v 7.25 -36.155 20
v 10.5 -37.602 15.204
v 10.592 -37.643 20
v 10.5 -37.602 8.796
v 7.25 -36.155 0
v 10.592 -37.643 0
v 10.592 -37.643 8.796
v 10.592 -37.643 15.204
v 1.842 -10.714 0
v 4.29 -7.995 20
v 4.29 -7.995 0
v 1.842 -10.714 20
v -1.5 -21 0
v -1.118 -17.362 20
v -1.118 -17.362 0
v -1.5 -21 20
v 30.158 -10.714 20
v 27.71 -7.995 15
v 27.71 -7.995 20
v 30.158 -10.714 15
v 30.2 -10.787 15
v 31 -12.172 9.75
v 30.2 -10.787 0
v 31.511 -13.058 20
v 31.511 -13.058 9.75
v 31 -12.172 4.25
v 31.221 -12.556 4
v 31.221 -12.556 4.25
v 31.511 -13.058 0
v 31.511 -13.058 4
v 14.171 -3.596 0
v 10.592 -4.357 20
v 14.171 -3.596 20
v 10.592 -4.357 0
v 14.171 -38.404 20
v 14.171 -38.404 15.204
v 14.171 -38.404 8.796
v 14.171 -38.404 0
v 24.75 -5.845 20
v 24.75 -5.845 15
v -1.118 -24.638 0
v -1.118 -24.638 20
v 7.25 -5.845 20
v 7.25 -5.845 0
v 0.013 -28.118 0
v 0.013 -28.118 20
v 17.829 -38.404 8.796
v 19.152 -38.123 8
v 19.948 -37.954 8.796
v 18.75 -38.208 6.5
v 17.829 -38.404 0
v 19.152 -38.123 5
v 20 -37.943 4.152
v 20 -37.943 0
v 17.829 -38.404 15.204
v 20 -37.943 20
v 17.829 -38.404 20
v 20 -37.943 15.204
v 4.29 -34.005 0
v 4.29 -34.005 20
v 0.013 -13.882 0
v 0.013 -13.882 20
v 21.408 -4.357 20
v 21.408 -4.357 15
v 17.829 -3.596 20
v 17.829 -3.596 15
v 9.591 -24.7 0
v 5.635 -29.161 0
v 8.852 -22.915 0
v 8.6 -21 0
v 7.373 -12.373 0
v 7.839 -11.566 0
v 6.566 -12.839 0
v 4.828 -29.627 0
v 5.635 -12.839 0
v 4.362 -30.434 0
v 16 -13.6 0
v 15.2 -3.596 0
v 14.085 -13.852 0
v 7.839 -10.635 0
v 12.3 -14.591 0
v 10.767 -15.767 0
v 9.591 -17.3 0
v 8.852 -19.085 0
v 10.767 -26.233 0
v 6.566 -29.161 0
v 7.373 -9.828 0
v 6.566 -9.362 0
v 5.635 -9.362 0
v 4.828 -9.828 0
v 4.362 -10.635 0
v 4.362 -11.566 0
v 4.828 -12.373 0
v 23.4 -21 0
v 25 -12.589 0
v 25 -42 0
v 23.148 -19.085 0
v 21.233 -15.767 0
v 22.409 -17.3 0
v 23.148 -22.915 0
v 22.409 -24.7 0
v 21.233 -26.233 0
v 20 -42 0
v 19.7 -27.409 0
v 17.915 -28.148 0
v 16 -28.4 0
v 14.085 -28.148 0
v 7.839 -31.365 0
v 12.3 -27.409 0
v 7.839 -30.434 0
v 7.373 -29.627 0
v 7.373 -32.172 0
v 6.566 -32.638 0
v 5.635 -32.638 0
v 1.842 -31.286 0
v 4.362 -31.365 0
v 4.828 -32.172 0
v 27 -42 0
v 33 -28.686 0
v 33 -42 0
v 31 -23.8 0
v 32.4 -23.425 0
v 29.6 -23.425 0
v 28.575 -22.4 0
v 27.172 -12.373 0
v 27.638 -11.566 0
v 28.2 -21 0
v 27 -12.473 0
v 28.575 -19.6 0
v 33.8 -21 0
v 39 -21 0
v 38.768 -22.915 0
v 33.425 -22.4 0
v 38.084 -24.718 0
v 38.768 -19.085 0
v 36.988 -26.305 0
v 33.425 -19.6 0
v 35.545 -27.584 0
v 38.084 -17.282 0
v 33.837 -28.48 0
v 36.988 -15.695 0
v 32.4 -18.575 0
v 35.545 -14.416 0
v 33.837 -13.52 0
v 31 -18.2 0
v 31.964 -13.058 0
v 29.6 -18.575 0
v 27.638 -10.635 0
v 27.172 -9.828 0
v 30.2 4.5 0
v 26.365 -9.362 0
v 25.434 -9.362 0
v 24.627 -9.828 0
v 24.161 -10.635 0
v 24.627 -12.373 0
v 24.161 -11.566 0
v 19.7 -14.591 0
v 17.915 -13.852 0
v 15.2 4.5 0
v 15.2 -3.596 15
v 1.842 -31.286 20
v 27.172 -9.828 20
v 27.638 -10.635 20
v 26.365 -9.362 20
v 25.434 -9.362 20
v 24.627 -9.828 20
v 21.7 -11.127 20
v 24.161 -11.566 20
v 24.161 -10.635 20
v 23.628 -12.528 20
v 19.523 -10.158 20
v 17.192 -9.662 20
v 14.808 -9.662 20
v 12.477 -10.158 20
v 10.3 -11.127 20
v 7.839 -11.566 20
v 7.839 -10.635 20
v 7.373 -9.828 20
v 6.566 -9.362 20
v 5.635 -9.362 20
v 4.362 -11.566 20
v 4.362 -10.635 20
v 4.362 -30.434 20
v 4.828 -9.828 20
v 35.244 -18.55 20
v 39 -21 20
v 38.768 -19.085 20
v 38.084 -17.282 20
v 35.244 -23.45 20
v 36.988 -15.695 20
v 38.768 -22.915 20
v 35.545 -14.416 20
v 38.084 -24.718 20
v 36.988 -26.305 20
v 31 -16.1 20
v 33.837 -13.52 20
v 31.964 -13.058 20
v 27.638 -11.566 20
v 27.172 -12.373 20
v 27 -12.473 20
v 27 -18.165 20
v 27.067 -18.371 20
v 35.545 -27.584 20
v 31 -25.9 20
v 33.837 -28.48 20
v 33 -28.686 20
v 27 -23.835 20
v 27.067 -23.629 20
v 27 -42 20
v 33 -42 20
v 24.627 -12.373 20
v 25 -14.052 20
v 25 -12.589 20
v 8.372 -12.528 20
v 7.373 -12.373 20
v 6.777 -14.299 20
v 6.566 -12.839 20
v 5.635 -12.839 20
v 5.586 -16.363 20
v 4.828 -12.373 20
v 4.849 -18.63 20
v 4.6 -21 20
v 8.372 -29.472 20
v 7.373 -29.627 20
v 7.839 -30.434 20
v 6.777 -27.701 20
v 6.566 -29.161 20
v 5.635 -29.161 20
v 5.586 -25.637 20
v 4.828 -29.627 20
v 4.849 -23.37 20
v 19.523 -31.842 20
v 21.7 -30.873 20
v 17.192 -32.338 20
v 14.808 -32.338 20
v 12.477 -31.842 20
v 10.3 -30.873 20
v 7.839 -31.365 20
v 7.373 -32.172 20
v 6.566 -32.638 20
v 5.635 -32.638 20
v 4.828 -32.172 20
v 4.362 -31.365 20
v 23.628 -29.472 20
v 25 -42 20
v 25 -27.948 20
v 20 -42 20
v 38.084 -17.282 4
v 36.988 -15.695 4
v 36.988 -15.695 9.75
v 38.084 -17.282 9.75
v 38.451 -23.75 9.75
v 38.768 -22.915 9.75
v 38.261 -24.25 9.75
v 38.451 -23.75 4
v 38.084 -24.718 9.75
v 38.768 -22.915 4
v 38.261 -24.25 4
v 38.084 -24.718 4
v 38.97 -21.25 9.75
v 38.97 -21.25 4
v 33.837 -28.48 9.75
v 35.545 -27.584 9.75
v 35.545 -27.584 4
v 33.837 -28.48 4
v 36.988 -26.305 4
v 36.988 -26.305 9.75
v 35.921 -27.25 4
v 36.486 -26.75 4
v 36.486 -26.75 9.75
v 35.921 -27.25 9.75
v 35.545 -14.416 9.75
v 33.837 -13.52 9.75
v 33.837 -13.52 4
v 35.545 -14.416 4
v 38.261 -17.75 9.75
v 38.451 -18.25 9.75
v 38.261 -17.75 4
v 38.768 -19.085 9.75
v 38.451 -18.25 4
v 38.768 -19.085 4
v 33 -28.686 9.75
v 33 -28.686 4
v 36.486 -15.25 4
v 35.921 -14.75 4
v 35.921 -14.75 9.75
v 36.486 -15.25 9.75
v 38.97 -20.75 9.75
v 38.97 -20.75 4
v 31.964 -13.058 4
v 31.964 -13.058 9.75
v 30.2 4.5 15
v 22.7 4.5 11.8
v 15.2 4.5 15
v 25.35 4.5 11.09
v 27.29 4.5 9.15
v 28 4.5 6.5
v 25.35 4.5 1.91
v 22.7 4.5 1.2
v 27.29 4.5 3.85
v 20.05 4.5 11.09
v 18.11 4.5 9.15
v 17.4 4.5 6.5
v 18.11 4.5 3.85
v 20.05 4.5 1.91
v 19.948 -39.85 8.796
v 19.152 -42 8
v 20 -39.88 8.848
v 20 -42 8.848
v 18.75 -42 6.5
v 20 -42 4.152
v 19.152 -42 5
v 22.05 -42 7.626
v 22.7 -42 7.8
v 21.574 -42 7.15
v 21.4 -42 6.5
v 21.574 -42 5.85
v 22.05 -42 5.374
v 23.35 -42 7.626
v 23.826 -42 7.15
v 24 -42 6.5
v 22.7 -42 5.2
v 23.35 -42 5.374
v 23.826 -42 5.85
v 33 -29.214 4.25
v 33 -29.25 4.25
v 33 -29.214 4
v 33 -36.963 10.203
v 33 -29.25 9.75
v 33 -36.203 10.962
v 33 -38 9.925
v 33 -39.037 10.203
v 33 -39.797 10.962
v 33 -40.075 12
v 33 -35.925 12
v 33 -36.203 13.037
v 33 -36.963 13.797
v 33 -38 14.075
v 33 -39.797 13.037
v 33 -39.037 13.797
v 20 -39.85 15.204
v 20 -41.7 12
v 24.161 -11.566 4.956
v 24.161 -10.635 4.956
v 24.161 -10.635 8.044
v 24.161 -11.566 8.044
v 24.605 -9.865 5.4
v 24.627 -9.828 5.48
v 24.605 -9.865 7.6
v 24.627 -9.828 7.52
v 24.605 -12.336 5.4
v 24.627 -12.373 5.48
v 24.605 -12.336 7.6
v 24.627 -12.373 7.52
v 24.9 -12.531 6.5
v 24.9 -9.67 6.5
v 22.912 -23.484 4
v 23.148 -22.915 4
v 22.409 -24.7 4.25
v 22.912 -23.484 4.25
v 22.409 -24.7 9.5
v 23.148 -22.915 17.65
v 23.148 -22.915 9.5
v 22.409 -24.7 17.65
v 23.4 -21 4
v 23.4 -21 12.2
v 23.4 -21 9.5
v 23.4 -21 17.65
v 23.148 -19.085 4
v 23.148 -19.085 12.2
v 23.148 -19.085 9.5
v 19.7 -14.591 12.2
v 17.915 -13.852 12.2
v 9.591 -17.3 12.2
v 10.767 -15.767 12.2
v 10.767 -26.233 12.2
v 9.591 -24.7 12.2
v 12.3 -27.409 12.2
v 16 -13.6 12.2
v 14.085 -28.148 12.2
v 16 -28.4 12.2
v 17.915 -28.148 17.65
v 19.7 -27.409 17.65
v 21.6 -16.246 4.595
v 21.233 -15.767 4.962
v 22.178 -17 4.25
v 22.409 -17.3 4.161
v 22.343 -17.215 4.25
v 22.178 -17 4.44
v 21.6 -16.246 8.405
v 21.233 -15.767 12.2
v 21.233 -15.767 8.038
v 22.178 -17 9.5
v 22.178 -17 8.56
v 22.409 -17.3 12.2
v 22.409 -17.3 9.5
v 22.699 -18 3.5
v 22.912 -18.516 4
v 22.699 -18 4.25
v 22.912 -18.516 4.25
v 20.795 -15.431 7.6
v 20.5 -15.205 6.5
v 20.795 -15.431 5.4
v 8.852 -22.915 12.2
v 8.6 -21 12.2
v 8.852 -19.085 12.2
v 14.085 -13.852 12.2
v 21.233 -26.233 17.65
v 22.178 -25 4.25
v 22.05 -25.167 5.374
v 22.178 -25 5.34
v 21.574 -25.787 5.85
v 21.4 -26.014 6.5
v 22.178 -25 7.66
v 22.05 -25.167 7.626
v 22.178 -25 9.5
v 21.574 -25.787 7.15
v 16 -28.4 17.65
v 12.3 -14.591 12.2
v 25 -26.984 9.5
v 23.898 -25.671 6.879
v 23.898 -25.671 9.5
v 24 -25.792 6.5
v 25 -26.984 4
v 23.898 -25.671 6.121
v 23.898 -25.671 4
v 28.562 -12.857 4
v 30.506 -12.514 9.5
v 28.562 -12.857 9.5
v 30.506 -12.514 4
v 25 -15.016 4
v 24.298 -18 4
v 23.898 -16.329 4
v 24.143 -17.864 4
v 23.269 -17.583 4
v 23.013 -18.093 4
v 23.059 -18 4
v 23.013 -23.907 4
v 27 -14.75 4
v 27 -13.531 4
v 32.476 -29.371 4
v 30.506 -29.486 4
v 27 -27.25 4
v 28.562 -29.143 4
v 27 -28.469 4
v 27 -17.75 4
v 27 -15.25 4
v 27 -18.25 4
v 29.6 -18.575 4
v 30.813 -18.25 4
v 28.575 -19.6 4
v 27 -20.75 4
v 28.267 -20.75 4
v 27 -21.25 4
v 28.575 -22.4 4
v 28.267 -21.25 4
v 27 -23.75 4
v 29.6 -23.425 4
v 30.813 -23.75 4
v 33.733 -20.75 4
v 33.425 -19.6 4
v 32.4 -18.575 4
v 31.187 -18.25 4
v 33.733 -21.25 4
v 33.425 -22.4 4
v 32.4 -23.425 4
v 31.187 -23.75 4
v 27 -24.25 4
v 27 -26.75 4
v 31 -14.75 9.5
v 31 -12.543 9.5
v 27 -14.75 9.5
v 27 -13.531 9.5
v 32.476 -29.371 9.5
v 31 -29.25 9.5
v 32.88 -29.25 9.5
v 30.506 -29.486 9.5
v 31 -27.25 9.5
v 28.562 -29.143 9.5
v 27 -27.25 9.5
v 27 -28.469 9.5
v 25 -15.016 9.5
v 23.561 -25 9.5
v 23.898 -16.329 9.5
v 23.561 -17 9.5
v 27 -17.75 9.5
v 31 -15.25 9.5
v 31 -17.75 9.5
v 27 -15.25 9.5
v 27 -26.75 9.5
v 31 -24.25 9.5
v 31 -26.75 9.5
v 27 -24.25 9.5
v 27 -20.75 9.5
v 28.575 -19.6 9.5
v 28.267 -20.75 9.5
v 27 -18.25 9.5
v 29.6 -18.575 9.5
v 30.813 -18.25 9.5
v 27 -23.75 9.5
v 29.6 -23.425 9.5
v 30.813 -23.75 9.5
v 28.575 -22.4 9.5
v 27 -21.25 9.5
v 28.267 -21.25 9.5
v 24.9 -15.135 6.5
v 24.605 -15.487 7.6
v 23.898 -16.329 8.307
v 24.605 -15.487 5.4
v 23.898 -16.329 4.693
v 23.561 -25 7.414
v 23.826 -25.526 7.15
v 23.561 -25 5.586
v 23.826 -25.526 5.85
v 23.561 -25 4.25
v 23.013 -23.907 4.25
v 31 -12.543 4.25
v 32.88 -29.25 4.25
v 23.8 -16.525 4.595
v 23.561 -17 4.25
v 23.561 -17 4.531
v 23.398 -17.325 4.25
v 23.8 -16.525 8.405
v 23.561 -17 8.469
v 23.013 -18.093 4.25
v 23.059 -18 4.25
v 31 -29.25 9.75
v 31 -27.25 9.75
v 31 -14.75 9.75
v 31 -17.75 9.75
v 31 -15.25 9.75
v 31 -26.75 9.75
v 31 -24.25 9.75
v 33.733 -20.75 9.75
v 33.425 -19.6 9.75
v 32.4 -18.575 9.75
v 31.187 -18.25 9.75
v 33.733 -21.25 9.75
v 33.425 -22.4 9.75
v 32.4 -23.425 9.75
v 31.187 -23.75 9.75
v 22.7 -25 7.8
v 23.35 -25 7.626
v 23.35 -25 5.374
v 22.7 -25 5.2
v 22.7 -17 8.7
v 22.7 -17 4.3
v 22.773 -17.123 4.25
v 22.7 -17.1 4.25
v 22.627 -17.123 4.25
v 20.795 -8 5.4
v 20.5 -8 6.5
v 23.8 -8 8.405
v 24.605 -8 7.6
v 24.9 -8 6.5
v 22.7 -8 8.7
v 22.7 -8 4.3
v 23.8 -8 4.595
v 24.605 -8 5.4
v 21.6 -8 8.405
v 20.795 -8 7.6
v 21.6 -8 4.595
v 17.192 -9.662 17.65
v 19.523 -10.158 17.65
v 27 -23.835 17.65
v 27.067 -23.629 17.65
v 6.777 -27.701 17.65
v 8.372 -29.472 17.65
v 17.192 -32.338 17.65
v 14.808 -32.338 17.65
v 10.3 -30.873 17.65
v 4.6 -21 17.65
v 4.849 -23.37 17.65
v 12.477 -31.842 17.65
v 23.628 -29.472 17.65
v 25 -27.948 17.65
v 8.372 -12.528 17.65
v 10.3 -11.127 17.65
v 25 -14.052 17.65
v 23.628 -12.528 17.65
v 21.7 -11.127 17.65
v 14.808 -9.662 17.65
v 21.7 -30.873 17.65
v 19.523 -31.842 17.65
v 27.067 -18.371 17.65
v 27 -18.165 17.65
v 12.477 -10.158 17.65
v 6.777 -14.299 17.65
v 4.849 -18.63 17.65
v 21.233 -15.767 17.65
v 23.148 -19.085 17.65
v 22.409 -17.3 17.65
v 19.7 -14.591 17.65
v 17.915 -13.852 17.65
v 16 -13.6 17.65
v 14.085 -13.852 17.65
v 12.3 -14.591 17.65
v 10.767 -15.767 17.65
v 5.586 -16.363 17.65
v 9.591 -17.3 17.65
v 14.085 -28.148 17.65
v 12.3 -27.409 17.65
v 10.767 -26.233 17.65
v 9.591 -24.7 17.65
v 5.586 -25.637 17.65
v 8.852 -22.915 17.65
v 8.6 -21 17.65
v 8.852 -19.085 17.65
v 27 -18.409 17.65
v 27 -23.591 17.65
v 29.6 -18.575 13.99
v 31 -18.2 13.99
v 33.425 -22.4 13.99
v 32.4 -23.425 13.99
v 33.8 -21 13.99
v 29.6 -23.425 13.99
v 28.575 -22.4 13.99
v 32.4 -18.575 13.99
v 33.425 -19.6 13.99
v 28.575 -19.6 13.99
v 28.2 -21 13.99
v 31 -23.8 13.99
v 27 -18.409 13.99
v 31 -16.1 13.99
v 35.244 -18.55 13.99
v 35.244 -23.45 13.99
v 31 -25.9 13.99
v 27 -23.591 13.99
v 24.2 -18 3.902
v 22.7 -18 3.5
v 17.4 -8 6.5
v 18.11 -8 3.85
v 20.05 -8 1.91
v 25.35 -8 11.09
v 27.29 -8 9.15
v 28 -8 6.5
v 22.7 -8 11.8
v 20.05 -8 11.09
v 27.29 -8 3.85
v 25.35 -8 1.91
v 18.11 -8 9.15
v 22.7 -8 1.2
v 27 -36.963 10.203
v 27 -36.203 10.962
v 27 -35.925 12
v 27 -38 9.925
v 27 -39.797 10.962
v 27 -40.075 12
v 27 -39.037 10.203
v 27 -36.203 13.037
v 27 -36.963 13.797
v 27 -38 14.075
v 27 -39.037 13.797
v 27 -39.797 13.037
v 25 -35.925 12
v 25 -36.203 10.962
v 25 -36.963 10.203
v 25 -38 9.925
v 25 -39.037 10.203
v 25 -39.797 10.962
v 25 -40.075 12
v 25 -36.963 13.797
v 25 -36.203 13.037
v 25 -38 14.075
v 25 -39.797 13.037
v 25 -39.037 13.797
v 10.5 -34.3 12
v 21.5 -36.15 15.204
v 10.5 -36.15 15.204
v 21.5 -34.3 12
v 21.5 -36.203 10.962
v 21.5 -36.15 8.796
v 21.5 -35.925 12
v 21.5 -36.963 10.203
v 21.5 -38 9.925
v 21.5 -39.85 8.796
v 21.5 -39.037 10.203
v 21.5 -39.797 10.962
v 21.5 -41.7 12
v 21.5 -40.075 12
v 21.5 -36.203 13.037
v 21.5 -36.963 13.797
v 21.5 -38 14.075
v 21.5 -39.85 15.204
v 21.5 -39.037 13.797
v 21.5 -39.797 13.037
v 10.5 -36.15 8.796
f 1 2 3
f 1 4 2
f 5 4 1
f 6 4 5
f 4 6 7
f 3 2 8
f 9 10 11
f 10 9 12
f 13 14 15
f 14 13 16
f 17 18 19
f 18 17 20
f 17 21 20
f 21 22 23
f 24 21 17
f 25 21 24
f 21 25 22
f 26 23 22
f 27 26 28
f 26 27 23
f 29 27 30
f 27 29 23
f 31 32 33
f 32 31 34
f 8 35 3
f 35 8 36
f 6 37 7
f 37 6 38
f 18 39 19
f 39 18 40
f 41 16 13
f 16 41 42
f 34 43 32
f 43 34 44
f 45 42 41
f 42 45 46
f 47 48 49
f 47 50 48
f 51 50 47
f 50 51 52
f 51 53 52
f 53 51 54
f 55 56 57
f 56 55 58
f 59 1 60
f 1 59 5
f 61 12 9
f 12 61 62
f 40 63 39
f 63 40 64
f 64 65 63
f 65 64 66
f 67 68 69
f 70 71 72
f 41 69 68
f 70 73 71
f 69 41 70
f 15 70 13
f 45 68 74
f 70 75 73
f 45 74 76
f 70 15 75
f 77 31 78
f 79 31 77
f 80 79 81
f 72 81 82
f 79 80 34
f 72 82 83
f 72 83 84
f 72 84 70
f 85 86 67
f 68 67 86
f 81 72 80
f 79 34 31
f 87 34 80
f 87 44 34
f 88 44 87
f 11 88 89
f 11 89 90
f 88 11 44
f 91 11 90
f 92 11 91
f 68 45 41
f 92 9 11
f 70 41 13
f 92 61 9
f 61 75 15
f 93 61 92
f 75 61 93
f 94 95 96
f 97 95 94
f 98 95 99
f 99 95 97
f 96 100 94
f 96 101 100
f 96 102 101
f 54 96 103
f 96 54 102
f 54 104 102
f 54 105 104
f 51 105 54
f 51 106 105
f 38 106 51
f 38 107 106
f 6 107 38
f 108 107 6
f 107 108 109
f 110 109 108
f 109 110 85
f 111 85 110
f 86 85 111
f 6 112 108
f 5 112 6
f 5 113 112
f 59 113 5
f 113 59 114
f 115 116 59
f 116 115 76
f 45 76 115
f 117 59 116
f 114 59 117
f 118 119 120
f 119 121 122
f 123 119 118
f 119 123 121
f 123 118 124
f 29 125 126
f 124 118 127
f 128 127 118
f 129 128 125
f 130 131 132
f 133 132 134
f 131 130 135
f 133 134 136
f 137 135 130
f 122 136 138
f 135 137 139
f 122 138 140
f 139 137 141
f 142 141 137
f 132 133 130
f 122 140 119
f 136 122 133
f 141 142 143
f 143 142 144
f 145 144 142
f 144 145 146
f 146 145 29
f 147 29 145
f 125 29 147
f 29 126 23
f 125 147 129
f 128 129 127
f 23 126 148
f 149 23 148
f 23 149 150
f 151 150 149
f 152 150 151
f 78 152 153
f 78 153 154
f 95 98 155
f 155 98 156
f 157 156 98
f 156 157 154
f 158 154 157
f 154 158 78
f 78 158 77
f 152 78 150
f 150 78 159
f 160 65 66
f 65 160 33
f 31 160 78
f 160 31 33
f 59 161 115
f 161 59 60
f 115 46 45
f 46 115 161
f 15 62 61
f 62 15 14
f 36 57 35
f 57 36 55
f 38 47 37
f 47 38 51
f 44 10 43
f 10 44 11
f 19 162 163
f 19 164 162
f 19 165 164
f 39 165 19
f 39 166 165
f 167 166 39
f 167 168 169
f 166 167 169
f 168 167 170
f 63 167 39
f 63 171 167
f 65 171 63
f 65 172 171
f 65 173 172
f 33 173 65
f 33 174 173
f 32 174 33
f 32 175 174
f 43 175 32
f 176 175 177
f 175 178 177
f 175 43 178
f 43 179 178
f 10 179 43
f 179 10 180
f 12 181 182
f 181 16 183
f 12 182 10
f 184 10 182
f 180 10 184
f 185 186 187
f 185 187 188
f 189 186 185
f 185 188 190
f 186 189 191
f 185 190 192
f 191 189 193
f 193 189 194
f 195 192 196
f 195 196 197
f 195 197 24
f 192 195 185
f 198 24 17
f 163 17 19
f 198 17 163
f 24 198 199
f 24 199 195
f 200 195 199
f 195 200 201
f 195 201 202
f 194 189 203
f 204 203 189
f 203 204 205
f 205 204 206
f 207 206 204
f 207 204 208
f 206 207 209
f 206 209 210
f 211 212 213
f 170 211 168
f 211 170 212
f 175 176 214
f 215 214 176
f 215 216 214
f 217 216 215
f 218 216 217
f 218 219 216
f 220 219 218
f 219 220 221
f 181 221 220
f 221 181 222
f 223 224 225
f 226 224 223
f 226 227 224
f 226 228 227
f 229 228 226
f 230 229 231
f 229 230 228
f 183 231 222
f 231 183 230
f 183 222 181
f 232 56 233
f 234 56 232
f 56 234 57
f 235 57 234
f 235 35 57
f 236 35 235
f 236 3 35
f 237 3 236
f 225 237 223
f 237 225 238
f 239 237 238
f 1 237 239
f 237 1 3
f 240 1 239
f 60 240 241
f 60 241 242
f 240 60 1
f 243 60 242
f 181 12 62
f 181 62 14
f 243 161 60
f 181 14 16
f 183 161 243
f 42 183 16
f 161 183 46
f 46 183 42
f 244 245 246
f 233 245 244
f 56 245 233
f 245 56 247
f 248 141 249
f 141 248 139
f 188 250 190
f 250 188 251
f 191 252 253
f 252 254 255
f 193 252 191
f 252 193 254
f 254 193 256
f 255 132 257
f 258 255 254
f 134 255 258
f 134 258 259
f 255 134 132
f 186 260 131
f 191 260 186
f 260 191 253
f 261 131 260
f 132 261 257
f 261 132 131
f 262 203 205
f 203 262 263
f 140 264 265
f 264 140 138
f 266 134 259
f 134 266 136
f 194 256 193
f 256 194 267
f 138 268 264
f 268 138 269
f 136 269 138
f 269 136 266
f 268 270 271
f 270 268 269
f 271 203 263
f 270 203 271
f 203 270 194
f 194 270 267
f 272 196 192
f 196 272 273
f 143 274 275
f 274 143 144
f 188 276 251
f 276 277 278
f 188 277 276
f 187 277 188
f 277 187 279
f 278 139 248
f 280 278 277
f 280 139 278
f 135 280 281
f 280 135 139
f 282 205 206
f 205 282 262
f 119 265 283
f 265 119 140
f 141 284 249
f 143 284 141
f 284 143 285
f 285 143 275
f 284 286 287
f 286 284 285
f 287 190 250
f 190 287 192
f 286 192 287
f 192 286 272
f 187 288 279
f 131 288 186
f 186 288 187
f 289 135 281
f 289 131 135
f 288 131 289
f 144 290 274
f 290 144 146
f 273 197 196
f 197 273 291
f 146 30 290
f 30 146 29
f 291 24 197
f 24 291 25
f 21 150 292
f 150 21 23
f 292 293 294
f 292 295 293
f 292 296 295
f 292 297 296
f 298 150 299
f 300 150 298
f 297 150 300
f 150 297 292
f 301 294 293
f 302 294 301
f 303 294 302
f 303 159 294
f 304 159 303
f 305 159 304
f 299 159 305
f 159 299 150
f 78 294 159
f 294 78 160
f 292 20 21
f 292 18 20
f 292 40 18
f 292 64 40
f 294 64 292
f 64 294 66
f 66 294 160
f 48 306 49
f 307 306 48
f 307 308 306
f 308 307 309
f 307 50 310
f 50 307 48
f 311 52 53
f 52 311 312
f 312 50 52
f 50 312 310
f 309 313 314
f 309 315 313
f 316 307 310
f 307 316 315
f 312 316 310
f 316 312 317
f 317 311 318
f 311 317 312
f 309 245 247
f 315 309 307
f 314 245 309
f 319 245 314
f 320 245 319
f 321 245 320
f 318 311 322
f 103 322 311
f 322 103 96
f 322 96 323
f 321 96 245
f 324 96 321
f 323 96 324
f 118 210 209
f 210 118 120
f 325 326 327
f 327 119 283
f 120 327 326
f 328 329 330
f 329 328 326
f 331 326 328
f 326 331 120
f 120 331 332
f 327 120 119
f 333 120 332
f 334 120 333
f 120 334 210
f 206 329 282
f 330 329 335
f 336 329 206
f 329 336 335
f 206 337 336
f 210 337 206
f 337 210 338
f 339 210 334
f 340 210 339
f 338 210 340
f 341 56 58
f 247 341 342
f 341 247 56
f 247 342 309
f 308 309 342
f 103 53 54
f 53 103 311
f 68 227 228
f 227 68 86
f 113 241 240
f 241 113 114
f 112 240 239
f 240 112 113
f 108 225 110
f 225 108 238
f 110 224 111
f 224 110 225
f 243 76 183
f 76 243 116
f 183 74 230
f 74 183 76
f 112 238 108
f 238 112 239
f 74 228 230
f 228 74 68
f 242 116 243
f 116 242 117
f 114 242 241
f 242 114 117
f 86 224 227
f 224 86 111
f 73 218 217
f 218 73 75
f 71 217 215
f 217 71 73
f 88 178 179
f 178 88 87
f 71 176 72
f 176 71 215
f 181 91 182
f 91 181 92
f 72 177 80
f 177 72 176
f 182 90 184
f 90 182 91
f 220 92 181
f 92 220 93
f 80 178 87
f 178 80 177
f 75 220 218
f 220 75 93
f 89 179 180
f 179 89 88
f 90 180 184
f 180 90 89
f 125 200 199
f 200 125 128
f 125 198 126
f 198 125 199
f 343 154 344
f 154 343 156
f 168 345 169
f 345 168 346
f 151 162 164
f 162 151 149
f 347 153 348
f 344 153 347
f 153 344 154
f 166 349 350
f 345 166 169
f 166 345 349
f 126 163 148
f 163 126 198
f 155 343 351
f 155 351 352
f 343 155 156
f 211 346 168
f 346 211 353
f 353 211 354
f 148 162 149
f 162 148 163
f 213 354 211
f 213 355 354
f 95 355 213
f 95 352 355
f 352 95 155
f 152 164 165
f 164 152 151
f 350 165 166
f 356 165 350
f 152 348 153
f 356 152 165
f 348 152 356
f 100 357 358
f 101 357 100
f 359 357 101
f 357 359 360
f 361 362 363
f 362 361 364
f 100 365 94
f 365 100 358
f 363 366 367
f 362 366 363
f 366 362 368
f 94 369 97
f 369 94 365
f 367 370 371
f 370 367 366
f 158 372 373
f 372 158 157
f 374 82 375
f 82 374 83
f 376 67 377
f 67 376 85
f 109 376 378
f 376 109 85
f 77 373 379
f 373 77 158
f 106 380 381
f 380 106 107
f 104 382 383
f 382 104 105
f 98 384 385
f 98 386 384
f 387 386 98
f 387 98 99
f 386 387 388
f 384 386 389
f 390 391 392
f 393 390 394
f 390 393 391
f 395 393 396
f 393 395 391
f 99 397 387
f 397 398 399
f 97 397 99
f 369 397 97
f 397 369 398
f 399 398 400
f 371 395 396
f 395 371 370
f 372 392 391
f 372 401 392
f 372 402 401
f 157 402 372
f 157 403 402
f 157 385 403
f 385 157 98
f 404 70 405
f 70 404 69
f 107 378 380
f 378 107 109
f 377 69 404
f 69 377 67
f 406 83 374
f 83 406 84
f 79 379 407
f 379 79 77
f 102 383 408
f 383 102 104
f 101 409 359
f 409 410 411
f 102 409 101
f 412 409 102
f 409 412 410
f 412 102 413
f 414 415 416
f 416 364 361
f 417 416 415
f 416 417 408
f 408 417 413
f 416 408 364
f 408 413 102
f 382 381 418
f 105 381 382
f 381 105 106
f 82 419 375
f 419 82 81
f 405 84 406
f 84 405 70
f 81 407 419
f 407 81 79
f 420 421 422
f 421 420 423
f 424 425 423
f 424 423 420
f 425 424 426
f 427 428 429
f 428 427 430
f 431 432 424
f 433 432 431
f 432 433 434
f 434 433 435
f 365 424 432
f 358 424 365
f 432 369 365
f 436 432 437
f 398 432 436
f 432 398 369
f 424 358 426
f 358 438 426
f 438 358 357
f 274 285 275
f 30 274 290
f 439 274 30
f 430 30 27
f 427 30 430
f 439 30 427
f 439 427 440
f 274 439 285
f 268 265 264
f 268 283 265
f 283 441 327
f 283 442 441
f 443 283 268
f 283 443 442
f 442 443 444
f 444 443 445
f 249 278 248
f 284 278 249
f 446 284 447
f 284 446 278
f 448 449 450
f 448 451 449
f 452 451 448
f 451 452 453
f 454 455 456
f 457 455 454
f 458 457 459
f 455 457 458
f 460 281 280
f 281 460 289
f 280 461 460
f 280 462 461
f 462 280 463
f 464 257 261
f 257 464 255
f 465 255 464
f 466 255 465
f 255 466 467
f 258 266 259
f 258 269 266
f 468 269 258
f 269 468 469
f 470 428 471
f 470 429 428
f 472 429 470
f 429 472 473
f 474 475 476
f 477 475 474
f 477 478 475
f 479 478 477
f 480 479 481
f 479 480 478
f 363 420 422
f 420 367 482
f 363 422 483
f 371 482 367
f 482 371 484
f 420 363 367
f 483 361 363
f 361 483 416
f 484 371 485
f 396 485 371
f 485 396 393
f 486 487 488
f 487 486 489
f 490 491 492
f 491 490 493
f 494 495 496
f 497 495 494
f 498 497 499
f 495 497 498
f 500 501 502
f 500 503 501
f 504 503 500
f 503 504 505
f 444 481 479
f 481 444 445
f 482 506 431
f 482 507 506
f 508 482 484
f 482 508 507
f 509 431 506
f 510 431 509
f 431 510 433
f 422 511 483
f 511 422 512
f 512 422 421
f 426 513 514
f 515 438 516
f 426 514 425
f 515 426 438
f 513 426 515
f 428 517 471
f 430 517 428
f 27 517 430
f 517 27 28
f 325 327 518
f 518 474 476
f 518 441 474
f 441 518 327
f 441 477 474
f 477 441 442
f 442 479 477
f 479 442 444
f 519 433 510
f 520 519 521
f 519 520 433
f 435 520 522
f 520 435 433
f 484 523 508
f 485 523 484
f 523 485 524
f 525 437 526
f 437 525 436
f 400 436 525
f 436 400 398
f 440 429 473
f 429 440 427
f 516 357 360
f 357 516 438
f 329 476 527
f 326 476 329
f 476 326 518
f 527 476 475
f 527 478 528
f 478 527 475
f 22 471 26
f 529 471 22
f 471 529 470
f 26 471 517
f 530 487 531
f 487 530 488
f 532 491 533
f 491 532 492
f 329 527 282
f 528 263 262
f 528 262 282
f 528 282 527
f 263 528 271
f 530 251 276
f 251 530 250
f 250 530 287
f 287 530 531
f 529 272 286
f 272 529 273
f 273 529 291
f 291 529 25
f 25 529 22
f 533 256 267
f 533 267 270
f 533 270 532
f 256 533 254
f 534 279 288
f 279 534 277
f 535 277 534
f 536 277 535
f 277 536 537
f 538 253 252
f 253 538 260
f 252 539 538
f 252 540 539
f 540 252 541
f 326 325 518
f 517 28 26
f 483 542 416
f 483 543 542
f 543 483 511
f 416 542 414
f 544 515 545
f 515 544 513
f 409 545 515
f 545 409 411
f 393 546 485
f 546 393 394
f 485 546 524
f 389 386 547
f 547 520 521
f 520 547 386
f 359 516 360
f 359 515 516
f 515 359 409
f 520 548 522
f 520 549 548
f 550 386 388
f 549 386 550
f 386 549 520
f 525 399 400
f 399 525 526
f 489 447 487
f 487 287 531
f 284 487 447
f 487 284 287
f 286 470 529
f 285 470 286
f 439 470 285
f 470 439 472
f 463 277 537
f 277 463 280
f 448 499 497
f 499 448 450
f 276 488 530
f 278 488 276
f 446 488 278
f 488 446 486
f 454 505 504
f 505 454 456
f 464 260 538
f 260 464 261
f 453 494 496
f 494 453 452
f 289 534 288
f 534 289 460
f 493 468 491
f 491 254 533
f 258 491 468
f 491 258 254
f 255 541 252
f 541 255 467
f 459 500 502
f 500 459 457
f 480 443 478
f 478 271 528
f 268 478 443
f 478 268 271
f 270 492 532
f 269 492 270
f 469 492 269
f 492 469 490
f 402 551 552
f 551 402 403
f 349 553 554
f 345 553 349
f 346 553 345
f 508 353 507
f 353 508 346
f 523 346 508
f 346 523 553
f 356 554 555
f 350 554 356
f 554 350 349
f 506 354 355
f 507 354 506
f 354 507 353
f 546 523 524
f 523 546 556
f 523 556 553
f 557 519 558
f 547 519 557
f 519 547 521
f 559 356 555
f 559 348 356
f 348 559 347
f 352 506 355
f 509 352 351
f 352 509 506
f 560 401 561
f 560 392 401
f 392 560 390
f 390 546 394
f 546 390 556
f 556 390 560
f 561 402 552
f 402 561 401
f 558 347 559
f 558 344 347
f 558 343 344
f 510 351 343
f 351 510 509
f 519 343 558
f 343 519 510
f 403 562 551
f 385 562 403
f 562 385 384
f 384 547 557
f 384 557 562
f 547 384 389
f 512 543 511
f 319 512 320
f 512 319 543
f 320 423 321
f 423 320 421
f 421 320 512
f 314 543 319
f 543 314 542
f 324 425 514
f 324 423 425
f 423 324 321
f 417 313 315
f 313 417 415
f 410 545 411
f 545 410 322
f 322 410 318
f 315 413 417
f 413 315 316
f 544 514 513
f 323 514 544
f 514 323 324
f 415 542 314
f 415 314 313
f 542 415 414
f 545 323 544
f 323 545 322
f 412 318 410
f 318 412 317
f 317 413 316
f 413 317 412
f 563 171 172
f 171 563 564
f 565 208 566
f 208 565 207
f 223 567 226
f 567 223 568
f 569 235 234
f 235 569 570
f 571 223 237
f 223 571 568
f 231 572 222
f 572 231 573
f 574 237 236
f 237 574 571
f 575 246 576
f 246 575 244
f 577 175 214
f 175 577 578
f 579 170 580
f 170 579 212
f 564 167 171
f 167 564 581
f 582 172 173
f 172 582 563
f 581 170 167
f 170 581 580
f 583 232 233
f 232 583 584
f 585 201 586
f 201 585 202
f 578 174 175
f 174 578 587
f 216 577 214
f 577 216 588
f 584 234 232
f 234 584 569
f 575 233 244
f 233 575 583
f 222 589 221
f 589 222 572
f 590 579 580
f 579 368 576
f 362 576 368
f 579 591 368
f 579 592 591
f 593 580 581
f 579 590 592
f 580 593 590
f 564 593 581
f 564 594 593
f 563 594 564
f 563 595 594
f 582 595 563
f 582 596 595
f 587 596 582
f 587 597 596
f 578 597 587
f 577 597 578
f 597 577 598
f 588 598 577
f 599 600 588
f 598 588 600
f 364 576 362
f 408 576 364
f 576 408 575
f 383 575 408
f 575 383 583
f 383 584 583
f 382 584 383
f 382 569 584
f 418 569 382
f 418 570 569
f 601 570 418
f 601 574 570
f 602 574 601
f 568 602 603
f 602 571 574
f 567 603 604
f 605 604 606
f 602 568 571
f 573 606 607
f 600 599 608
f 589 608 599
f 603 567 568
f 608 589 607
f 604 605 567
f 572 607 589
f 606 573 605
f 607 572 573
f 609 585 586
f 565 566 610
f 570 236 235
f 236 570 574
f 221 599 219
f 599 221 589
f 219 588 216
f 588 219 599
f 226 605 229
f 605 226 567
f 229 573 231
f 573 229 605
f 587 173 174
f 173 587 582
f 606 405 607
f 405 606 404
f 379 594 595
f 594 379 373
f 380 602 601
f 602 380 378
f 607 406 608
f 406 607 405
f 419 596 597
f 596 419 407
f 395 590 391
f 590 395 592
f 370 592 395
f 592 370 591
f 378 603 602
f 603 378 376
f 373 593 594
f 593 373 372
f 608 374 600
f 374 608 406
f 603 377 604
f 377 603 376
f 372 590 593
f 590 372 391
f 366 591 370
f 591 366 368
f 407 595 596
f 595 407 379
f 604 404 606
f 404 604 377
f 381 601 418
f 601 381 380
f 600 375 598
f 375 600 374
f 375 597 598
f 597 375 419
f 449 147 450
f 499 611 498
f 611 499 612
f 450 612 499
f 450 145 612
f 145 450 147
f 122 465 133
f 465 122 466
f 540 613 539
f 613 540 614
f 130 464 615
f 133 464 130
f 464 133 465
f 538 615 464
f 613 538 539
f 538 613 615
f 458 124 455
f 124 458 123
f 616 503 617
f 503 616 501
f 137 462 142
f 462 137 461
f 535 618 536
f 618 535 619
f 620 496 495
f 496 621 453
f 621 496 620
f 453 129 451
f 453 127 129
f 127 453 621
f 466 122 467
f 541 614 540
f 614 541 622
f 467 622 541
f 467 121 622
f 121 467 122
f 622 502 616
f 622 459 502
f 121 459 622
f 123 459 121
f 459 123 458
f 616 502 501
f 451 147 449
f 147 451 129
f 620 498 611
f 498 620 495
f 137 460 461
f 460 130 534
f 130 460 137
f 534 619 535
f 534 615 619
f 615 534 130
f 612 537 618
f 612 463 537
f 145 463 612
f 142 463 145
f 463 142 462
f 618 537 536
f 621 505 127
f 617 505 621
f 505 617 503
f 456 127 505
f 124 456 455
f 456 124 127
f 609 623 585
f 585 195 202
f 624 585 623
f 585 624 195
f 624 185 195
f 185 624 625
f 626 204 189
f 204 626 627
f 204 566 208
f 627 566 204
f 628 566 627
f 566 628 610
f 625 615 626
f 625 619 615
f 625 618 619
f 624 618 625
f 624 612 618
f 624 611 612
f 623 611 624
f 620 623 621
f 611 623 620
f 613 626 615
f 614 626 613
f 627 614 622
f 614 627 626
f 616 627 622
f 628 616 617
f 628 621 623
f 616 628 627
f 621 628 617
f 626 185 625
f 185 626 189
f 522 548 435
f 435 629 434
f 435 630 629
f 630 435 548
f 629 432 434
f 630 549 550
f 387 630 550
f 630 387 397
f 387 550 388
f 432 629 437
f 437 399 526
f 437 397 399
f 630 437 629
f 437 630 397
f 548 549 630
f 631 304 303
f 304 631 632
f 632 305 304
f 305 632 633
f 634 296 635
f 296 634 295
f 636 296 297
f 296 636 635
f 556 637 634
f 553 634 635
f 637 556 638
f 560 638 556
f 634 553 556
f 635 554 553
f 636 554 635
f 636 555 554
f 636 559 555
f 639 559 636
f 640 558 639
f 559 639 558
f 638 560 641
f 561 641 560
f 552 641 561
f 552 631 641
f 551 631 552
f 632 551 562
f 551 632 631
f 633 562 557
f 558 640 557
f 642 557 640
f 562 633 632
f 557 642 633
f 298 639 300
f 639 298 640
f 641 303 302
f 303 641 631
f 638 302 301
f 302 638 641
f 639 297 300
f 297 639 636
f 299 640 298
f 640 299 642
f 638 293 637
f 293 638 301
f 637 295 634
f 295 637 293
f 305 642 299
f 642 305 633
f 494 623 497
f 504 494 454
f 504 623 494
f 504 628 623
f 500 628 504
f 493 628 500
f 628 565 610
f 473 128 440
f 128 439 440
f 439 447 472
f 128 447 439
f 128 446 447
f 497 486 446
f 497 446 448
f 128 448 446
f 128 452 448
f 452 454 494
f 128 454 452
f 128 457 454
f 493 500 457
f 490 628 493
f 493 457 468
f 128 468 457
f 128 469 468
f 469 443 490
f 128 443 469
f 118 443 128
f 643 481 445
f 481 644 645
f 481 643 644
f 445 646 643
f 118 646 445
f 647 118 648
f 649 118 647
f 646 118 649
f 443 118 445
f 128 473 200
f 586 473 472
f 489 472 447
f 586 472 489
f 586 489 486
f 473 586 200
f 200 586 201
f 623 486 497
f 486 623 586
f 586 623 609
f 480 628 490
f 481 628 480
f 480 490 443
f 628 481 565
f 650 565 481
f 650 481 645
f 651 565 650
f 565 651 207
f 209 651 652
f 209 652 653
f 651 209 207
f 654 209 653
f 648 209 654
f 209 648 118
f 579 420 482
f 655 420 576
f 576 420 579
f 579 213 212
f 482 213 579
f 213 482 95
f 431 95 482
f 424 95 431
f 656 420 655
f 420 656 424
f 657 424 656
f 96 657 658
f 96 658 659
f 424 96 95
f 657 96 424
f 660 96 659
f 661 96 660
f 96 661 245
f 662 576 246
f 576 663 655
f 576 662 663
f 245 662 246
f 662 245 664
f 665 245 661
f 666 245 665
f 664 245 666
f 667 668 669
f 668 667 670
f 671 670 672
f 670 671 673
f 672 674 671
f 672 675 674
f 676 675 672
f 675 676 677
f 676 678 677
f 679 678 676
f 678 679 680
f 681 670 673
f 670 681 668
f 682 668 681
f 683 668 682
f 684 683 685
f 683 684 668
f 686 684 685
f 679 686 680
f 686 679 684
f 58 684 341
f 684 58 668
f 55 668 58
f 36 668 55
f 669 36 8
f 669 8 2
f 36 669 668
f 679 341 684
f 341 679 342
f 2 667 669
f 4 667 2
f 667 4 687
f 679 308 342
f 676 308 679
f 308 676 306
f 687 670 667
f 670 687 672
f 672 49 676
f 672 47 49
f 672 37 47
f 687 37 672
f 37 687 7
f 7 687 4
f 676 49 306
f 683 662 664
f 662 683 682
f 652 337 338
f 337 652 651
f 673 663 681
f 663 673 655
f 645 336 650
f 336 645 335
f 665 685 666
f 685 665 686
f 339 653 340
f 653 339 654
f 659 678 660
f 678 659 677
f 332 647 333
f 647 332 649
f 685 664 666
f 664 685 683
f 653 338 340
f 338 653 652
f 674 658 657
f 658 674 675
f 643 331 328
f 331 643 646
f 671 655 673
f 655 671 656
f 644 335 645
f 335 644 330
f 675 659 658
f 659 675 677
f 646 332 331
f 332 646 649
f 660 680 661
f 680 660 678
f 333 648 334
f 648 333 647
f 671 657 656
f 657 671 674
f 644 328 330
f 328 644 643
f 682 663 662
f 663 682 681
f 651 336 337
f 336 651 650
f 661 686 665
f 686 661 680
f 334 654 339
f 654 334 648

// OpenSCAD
// file: configuration.scad
// Increase this if your slicer or printer make holes too tight.
extra_radius = 0.1;
extra_extrusion_width = 0.5;

// OD = outside diameter, corner to corner.
m3_nut_od = 6.1;
m3_nut_radius = m3_nut_od/2 + 0.45 + extra_radius;
m3_washer_radius = 3.5 + extra_radius;

// Major diameter of metric 3mm thread.
m3_major = 2.85;
m3_radius = m3_major/2 + extra_radius;
m3_wide_radius = m3_major/2 + extra_radius + 0.45;

// NEMA17 stepper motors.
motor_shaft_diameter = 5;
motor_shaft_radius = motor_shaft_diameter/2 + extra_radius;

// Frame brackets. M3x8mm screws work best with 3.6 mm brackets.
thickness = 3.6;

// OpenBeam or Misumi. Currently only 15x15 mm, but there is a plan
// to make models more parametric and allow 20x20 mm in the future.
extrusion = 15;

// Placement for the NEMA17 stepper motors.
motor_offset = 44;
motor_length = 47;
// main file
// Based on "Makergear Filament drive goes Bowden" by Luke321
// http://www.thingiverse.com/thing:63674

include <configuration.scad>;

filament_offset = 22.7;
filament_height = 0;

module extruder() {
  rotate([90, 0, 0]) difference() {
    union() {
      //main cylinder
      translate([16,20,21]) rotate([90,0,0]) cylinder(h=20, r=17.5);

      //bearing mount
      translate([31,20,21]) rotate([90,0,0]) cylinder (h=20, r=8);

      //pushfit/pneufit mount
      translate([filament_offset, 7.5, 13])
        //cylinder(r=7.5, h=35, center=true, $fn=6);
		   cube([15, 15, 35], center=true);

      //filament support
      translate([21.75,6.5,34]) rotate([0,0,0]) cylinder (h=8, r=3, $fn=12);

      //clamp
      translate([20, 0, 28]) cube([13, 20, 14]);
    }

    //pulley opening
    translate([16,21,21]) rotate([90,0,0]){
      cylinder (h=22, r=7.4);

      rotate([0,0,45]) {
        //translate([14,0,0]) cylinder(h=22, r=1.6, $fn=12);
        translate([0,14,0]) cylinder(h=22, r=1.8, $fn=12);
        translate([-14,0,0]) cylinder(h=22, r=1.8, $fn=12);
        translate([0,-14,0]) cylinder(h=22, r=1.8, $fn=12);
      }
    }

    //gearhead indentation
    translate([16,21,21]) rotate([90,0,0]) cylinder (h=3.35, r=11.4);

    //pulley hub indentation
    translate([16,20-2,21]) rotate([90,0,0]) cylinder (h=5.8, r=7.4);

    //bearing screws
    translate([31,21,21]) rotate([90,0,0]) cylinder (h=22, r=2.8, $fn=12);
    translate([31,22,21]) rotate([90,30,0]) cylinder (h=8.01, r=4.9, $fn=6);

    //bearing
    difference() {
      union() {
        translate([31,9.5,21]) rotate([90,0,0]) cylinder (h=5.5, r=8.5);
        translate([31,9.5-5.25,21-8.25-2]) cube([20, 5.5, 18.5]);
        //opening between bearing and pulley
        translate([20,9.5-5.25,21-8.25+3.25+1]) cube([10, 5.25, 8]);
      }
      //removable supports
      for (z = [15:3:27]) {
        translate([36, 10, z]) cube([20, 20, 0.5], center=true);
      }
    }

    //filament path chamfer
    translate([filament_offset,6.5,15]) rotate([0,0,0])
      cylinder(h=3, r1=0.5, r2=3, $fn=12);

    //filament path
    translate([filament_offset,6.5,-10]) rotate([0,0,0]){
      cylinder(h=30, r=2.2, $fn=12);
	  cylinder(h=60, r=1.3, $fn=12);
	}

    //pushfit/pneufit mount
    translate([filament_offset, 6.5, -6]) cylinder(r=5.3, h=14, $fn=12);

    //clamp slit
    translate([25,-1,10]) cube([2, 22, 35]);
    //clamp nut
    translate([10.5,12,38]) rotate([0,90,0])
      cylinder(h=11, r=m3_nut_radius+0.1, $fn=6);
    //clamp screw hole
    translate([15,12,38]) rotate([0,90,0])
      cylinder(h=20, r=m3_wide_radius+0.1, $fn=12);
  }
}

extruder();
